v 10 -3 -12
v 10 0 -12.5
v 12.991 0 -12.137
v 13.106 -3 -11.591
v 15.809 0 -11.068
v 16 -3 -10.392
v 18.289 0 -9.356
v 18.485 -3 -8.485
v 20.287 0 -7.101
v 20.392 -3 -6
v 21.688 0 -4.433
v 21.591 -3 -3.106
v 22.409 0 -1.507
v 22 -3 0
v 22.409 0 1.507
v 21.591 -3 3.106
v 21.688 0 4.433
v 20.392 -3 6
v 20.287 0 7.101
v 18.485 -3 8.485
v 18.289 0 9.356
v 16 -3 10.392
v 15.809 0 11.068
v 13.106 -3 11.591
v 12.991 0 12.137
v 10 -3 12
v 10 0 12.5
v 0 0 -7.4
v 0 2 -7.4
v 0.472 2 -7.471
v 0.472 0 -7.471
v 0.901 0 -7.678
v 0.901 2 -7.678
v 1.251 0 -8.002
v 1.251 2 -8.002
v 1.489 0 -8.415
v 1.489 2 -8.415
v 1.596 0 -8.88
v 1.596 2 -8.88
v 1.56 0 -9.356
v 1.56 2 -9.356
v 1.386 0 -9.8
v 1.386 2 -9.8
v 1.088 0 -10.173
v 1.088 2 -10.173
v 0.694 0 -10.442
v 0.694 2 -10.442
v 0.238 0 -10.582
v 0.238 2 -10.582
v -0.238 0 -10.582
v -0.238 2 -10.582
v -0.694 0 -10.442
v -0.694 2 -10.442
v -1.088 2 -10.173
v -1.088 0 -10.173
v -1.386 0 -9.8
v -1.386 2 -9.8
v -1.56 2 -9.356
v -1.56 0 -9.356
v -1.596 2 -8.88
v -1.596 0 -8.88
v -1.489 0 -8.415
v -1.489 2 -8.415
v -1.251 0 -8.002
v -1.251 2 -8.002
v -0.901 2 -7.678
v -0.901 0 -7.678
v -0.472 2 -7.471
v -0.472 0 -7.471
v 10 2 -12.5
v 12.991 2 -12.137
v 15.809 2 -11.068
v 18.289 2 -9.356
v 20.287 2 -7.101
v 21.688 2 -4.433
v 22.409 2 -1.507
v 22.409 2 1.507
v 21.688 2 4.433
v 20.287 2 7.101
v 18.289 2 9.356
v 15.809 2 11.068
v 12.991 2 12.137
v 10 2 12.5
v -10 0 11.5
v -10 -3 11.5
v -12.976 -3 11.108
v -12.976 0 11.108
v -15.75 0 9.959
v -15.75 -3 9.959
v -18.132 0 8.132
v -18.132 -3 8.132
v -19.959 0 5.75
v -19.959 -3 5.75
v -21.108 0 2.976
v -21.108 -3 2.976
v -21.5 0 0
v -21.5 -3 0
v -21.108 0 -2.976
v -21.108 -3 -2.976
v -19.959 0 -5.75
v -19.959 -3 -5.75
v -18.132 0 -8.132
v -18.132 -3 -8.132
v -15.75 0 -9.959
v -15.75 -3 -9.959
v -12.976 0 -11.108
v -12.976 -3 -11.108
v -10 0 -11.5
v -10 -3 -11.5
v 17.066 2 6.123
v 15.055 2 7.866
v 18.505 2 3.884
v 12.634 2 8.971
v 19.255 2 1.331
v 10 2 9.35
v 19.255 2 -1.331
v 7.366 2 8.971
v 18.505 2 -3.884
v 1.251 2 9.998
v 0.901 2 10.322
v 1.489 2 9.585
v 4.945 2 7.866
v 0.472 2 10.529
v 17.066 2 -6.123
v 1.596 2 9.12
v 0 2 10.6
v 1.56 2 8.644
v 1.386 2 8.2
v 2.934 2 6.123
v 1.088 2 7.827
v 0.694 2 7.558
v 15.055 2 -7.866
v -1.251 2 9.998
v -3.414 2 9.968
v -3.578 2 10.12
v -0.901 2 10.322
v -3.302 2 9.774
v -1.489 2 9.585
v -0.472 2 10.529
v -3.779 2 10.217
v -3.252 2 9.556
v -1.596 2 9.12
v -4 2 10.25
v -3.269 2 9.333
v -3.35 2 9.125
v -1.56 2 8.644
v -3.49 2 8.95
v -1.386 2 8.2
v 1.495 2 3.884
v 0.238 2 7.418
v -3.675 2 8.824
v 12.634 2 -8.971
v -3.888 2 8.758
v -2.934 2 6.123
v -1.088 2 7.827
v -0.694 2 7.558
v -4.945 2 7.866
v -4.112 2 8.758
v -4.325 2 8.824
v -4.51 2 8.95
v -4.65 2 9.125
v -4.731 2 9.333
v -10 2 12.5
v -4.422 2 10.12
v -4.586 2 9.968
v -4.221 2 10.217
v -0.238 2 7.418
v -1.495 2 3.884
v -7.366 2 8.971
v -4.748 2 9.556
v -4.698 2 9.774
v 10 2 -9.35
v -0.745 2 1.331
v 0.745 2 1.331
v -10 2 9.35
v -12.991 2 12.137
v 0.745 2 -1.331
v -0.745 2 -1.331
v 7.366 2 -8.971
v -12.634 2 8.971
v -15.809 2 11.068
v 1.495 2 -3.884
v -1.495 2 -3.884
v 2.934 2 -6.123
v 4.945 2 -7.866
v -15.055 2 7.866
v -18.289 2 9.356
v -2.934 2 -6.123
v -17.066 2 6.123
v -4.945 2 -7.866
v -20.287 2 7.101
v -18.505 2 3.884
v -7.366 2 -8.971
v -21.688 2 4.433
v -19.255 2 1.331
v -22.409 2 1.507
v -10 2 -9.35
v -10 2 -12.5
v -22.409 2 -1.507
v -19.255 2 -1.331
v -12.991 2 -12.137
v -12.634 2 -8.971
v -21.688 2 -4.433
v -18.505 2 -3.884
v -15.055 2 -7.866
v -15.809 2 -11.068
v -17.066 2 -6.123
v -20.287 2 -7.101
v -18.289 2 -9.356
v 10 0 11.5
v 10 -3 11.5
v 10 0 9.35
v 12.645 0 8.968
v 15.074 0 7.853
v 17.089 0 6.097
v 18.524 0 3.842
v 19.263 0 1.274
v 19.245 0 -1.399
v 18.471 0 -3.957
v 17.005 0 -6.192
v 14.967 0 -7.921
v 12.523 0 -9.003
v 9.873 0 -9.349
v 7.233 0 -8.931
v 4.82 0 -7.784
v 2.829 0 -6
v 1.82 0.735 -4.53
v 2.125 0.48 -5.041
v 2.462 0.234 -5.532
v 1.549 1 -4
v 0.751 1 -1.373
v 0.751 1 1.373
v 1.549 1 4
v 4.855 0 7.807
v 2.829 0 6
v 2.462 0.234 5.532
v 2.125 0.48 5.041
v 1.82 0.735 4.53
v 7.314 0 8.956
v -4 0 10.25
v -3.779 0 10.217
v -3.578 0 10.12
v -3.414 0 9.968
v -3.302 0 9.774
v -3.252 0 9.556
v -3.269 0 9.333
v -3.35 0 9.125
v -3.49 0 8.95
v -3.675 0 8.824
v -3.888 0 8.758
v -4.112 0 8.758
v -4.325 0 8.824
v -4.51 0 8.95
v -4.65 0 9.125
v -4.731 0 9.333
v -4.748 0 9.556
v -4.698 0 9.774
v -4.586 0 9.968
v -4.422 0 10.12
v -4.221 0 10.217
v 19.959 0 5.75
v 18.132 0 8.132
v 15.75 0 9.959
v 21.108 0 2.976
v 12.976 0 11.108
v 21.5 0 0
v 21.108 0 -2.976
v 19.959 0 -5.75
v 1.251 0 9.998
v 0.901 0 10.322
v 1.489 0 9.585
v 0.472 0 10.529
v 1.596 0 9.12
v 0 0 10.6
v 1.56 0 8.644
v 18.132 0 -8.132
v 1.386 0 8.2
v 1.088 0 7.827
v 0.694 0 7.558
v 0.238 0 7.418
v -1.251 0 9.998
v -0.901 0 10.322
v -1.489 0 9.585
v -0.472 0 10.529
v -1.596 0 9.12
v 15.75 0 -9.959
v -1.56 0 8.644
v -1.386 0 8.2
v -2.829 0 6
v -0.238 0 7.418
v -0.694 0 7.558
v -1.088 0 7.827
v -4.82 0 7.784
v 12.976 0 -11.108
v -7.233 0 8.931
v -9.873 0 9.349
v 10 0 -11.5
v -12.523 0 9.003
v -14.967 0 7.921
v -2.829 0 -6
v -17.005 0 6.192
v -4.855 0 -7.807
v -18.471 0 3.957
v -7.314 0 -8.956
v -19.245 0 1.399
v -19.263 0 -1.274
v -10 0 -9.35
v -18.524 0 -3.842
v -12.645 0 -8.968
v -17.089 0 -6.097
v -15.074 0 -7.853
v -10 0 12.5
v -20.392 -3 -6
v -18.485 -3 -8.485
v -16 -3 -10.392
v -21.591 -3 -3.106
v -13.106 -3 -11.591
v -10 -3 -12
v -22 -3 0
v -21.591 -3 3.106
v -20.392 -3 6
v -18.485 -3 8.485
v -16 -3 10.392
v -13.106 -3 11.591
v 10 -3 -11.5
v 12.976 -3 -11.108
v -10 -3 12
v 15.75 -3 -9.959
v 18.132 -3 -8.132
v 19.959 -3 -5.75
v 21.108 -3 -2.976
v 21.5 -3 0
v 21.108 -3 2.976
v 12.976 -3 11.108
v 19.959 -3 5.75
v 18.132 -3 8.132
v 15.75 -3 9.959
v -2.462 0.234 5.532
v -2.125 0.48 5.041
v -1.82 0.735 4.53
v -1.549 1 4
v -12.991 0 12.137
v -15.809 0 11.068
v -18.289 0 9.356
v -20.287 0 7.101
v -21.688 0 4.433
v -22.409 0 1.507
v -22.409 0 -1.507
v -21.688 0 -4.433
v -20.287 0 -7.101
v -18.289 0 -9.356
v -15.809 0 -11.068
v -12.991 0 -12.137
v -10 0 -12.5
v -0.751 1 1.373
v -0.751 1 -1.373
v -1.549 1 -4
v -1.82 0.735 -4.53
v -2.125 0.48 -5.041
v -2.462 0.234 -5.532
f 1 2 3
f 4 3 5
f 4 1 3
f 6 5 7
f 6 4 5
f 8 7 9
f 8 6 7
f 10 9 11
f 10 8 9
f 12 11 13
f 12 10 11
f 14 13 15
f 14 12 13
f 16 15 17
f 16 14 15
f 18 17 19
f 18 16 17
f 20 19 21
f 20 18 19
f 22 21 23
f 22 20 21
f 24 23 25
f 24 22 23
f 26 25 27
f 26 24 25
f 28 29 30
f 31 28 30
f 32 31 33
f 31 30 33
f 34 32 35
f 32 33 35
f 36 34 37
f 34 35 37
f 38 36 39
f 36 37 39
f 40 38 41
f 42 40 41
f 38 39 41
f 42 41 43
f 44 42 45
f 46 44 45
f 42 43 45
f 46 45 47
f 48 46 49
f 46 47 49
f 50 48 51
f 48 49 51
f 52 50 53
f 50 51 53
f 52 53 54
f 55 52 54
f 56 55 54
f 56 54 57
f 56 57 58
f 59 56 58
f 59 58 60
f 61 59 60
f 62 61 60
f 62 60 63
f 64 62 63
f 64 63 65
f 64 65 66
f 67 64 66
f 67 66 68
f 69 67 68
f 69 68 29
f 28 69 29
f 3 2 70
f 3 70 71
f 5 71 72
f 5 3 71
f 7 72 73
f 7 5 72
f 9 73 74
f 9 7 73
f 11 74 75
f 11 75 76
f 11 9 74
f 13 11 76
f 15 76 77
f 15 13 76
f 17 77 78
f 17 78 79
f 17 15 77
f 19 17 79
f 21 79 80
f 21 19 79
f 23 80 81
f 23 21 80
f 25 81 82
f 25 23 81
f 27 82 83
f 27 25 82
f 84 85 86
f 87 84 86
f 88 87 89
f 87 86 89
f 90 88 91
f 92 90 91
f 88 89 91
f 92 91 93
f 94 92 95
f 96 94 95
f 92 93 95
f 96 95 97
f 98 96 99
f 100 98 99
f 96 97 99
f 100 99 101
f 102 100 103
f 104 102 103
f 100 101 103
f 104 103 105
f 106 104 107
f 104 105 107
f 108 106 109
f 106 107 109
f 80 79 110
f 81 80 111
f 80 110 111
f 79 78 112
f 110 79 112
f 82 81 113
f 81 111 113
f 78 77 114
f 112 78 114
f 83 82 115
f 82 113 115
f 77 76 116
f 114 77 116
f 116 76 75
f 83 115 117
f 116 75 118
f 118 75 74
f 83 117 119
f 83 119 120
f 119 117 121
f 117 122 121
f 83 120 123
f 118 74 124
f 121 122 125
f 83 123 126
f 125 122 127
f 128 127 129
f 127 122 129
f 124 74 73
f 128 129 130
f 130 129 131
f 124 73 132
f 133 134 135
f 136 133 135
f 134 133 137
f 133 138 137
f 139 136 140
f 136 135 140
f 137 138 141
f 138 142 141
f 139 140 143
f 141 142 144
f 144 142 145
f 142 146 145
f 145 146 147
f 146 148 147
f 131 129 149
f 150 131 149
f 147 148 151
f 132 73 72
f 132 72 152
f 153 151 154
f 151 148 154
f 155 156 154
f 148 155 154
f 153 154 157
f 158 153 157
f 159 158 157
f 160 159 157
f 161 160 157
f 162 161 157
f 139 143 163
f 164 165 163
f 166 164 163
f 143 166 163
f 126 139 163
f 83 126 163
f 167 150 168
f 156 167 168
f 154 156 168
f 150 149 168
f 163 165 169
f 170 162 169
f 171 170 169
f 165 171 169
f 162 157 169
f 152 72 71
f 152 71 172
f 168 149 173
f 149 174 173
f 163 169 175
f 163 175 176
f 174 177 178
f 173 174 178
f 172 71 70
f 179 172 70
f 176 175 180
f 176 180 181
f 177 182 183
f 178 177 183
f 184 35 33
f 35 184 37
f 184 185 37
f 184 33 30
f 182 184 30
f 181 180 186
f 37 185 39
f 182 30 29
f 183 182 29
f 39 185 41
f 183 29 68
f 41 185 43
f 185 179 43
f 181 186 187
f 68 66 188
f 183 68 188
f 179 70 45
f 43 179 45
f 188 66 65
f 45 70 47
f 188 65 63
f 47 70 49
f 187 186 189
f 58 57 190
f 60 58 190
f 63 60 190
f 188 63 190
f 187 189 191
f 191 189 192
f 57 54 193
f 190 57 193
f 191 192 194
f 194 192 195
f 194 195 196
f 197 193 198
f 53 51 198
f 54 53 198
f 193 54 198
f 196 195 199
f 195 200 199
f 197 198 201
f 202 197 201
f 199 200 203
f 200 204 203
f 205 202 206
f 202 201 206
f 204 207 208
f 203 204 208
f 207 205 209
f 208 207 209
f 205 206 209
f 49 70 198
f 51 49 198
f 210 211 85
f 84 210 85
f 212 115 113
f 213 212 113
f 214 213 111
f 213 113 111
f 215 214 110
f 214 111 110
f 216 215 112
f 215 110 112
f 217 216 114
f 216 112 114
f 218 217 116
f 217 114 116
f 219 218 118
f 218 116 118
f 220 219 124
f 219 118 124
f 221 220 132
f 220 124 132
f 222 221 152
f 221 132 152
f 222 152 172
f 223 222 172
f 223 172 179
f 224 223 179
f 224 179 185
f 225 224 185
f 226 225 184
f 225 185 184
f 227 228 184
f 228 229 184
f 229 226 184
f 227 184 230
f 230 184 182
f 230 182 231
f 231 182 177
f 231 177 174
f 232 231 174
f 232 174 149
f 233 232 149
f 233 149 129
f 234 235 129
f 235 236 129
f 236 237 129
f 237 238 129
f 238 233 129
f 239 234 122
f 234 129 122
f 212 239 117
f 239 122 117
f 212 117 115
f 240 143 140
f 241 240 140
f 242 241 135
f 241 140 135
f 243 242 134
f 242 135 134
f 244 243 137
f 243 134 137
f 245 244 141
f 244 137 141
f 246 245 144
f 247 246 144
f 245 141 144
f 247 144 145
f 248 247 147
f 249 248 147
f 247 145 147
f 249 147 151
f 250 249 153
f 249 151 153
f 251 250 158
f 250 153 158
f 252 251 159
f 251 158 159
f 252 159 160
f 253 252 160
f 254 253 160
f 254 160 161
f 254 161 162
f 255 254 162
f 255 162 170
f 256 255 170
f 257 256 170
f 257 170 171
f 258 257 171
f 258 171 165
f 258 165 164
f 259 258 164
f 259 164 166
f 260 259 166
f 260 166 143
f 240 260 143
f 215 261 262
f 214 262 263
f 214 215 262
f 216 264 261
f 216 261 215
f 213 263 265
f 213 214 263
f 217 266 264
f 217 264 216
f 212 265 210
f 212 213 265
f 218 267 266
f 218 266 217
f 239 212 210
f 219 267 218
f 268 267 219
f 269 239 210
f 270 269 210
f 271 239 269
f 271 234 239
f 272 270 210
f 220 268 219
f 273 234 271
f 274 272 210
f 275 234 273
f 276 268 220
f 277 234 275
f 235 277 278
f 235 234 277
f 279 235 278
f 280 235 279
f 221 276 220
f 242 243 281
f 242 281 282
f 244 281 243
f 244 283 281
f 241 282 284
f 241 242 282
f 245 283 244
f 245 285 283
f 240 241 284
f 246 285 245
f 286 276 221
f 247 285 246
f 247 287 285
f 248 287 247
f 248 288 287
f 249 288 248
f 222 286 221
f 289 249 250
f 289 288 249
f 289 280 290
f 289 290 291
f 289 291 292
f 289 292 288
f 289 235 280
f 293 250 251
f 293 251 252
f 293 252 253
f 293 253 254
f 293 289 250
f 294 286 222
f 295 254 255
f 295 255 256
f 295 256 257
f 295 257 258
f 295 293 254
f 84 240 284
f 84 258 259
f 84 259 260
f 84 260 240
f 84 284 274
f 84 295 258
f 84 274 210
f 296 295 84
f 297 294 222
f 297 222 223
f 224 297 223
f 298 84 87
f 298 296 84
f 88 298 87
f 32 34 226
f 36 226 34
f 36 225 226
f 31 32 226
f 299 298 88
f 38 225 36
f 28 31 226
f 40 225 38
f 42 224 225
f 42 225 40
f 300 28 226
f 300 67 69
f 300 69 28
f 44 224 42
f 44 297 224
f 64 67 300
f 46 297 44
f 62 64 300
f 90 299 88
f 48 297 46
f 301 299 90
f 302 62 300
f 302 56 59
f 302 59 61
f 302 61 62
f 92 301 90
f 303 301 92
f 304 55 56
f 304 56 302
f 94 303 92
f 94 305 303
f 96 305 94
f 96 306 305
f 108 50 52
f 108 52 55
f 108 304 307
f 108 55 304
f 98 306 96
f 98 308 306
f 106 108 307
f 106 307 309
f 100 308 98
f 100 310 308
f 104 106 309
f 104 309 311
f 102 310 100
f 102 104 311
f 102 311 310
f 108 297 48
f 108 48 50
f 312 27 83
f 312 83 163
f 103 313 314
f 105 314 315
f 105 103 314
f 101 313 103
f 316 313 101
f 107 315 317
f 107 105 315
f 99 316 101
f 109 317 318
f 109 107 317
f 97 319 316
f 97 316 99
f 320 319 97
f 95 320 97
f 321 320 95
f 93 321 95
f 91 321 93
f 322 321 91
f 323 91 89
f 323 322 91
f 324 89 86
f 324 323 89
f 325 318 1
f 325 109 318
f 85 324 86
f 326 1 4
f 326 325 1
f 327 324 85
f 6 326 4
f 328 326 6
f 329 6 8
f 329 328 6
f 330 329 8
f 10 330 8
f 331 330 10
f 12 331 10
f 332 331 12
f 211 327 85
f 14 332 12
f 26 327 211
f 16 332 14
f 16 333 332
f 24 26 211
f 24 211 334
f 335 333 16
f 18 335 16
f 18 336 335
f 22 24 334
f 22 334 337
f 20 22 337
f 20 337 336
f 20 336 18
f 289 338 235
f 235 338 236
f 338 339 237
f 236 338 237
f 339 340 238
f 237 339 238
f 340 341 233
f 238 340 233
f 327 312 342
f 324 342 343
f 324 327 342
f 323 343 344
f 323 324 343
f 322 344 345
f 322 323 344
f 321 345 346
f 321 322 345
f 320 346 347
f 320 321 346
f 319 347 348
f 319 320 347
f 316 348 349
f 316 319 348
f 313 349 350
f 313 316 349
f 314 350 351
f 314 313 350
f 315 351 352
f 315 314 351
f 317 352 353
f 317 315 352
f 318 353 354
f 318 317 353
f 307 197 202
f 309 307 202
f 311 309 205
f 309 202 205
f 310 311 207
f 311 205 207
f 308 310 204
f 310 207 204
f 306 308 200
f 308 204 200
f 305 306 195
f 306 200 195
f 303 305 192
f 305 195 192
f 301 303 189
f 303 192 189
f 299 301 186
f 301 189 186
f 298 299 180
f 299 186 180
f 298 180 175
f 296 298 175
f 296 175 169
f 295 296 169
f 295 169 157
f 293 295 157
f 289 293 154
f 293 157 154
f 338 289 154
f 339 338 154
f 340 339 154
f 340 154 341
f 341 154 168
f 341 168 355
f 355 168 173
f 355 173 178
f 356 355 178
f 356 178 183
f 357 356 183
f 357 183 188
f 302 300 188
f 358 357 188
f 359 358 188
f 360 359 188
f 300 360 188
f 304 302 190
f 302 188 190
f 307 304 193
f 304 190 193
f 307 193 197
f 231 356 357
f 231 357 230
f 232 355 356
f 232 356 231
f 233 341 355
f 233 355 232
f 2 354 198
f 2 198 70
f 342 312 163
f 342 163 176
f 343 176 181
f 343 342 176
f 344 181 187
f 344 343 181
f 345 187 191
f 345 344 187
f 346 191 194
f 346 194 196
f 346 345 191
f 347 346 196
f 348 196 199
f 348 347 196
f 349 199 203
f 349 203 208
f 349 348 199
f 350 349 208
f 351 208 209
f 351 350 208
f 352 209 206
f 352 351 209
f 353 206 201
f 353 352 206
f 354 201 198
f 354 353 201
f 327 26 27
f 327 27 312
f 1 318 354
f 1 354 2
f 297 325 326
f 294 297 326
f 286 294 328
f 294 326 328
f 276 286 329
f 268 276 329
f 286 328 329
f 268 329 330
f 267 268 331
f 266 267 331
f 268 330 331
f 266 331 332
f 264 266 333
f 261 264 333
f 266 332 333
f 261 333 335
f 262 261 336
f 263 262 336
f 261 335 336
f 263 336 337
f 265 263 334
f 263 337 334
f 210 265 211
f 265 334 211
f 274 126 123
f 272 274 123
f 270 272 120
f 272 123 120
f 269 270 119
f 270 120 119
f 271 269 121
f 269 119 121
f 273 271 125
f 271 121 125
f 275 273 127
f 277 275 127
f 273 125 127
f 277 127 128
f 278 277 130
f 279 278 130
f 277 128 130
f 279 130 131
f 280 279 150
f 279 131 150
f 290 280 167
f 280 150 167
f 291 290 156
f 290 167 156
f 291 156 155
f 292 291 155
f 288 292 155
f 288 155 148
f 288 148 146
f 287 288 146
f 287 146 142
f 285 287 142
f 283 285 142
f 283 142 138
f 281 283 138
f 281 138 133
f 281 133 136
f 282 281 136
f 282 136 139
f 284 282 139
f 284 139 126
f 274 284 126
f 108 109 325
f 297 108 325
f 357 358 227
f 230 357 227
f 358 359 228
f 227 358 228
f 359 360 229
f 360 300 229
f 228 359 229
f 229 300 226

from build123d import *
from OCP.BRepFilletAPI import BRepFilletAPI_MakeChamfer

# Parameters (mm, degrees)
BOSS_EXTRUDE1_DEPTH = 2
SKETCH2_R           = 9.35
CUT_EXTRUDE1_DEPTH  = 26.816661287
BOSS_EXTRUDE3_START = 3
BOSS_EXTRUDE3_DEPTH = 3
CHAMFER1_SIZE       = 3
CHAMFER1_SIZE2      = 0.5
SKETCH5_W           = 15
SKETCH5_H           = 12
CUT_EXTRUDE3_DEPTH  = 1
CHAMFER2_SIZE       = 2
CHAMFER2_SIZE_2     = 1
SKETCH7_R           = 0.75
SKETCH7_R_2         = 1.6
CUT_EXTRUDE4_DEPTH  = 27.220221204


with BuildPart() as part:
    # Sketch1 → Boss-Extrude1 (new body)
    with BuildSketch(Plane(origin=(0, 0, 0), x_dir=(1, 0, 0), z_dir=(0, 1, 0))):
        with BuildLine():
            Line((10, -12.5), (-10, -12.5))
            ThreePointArc((-10, -12.5), (-22.5, 0), (-10, 12.5))
            Line((-10, 12.5), (10, 12.5))
            ThreePointArc((10, 12.5), (22.5, 0), (10, -12.5))
        make_face()
    extrude(amount=BOSS_EXTRUDE1_DEPTH)

    # Sketch2 → Cut-Extrude1 (cut, through all)
    with BuildSketch(Plane(origin=(0, 2, 0), x_dir=(1, 0, 0), z_dir=(0, 1, 0))):
        with Locations(Location((10, 0, 0), (0, 0, 270))):
            Circle(SKETCH2_R)
        with Locations(Location((-10, 0, 0), (0, 0, 90))):
            Circle(SKETCH2_R)
    extrude(amount=-CUT_EXTRUDE1_DEPTH, mode=Mode.SUBTRACT)

    # Sketch3 → Boss-Extrude3 (add)
    with BuildSketch(Plane.XZ.offset(BOSS_EXTRUDE3_START)):
        with BuildLine():
            Line((-10, -12.5), (10, -12.5))
            ThreePointArc((10, -12.5), (22.5, 0), (10, 12.5))
            Line((10, 12.5), (-10, 12.5))
            ThreePointArc((-10, 12.5), (-22.5, 0), (-10, -12.5))
        make_face()
        with BuildLine():
            Line((-10, -11.5), (10, -11.5))
            ThreePointArc((10, -11.5), (21.5, 0), (10, 11.5))
            Line((10, 11.5), (-10, 11.5))
            ThreePointArc((-10, 11.5), (-21.5, 0), (-10, -11.5))
        make_face(mode=Mode.SUBTRACT)
    extrude(amount=-BOSS_EXTRUDE3_DEPTH)

    # Chamfer1: one chamfer whose edges measure the first distance from different faces: ONE call of the kernel's chamfer builder (chamfer() names one face for all edges)
    chamfer1_edges_1 = [part.edges().sort_by_distance(p)[0] for p in [
        (22.5, -3, 0),
    ]]
    chamfer1_side_1 = [part.faces().sort_by_distance(p)[0] for p in [
        (22.5, -0.5, 0),
    ]]
    chamfer1_edges_2 = [part.edges().sort_by_distance(p)[0] for p in [
        (0, -3, 12.5),
    ]]
    chamfer1_side_2 = [part.faces().sort_by_distance(p)[0] for p in [
        (0, -0.5, 12.5),
    ]]
    chamfer1_edges_3 = [part.edges().sort_by_distance(p)[0] for p in [
        (-22.5, -3, 0),
    ]]
    chamfer1_side_3 = [part.faces().sort_by_distance(p)[0] for p in [
        (-22.5, -0.5, 0),
    ]]
    chamfer1_edges_4 = [part.edges().sort_by_distance(p)[0] for p in [
        (0, -3, -12.5),
    ]]
    chamfer1_side_4 = [part.faces().sort_by_distance(p)[0] for p in [
        (0, -0.5, -12.5),
    ]]
    chamfer1 = BRepFilletAPI_MakeChamfer(part.part.solid().wrapped)
    for e in chamfer1_edges_1:
        chamfer1.Add(CHAMFER1_SIZE, CHAMFER1_SIZE2, e.wrapped, chamfer1_side_1[0].wrapped)  # the first distance lies on this face
    for e in chamfer1_edges_2:
        chamfer1.Add(CHAMFER1_SIZE, CHAMFER1_SIZE2, e.wrapped, chamfer1_side_2[0].wrapped)  # the first distance lies on this face
    for e in chamfer1_edges_3:
        chamfer1.Add(CHAMFER1_SIZE, CHAMFER1_SIZE2, e.wrapped, chamfer1_side_3[0].wrapped)  # the first distance lies on this face
    for e in chamfer1_edges_4:
        chamfer1.Add(CHAMFER1_SIZE, CHAMFER1_SIZE2, e.wrapped, chamfer1_side_4[0].wrapped)  # the first distance lies on this face
    add(Compound.cast(chamfer1.Shape()), mode=Mode.REPLACE)

    # Sketch5 → Cut-Extrude3 (cut)
    with BuildSketch(Plane.XZ):
        Rectangle(SKETCH5_W, SKETCH5_H)
    extrude(amount=-CUT_EXTRUDE3_DEPTH, mode=Mode.SUBTRACT)

    # Chamfer2
    chamfer2_edges_1 = [part.edges().sort_by_distance(p)[0] for p in [
        (0, 1, -6),
    ]]
    chamfer2_side_1 = [part.faces().sort_by_distance(p)[0] for p in [
        (0, 1, -5.98),
    ]]
    chamfer2_edges_2 = [part.edges().sort_by_distance(p)[0] for p in [
        (0, 1, 6),
    ]]
    chamfer2_side_2 = [part.faces().sort_by_distance(p)[0] for p in [
        (0, 0.98, 6),
    ]]
    chamfer2 = BRepFilletAPI_MakeChamfer(part.part.solid().wrapped)
    for e in chamfer2_edges_1:
        chamfer2.Add(CHAMFER2_SIZE - 0.0001, CHAMFER2_SIZE_2 - 0.0001, e.wrapped, chamfer2_side_1[0].wrapped)
    for e in chamfer2_edges_2:
        chamfer2.Add(CHAMFER2_SIZE_2 - 0.0001, CHAMFER2_SIZE - 0.0001, e.wrapped, chamfer2_side_2[0].wrapped)
    add(Compound.cast(chamfer2.Shape()), mode=Mode.REPLACE)  # a hair under: the kernel refuses the full size

    # Sketch7 → Cut-Extrude4 (cut, through all)
    with BuildSketch(Plane(origin=(0, 2, 0), x_dir=(1, 0, 0), z_dir=(0, 1, 0))):
        with Locations(Location((-4, -9.5, 0), (0, 0, 270))):
            Circle(SKETCH7_R)
        with Locations(Location((0, -9, 0), (0, 0, 270))):
            Circle(SKETCH7_R_2)
        with Locations(Location((0, 9, 0), (0, 0, 270))):
            Circle(SKETCH7_R_2)
    extrude(amount=-CUT_EXTRUDE4_DEPTH, mode=Mode.SUBTRACT)


solid = part.part
